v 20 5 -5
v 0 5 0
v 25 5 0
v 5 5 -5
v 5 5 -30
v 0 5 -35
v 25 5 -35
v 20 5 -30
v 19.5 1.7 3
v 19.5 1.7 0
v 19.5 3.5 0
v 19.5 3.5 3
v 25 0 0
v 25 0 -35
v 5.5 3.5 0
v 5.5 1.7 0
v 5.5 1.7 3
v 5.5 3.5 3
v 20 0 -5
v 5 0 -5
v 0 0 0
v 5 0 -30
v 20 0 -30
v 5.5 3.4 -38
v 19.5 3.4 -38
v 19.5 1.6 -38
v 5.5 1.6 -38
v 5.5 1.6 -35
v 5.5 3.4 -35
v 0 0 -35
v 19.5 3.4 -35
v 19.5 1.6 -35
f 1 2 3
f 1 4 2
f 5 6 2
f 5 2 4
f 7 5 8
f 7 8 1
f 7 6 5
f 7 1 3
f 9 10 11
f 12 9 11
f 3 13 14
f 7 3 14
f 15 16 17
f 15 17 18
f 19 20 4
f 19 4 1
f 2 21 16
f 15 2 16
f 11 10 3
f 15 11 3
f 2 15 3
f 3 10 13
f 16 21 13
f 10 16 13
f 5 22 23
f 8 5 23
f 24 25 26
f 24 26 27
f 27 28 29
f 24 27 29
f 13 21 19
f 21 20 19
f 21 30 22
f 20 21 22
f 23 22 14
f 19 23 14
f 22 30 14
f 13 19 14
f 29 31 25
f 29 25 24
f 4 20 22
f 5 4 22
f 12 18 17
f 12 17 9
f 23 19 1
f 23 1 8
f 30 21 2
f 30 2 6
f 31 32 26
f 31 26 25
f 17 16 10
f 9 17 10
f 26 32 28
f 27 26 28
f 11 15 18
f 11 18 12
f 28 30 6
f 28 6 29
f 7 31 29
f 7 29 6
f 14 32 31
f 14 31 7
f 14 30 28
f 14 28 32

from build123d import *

# Parameters (mm, degrees)
SKETCH1_W           = 25
SKETCH1_H           = 35
SKETCH1_W_2         = 15
SKETCH1_H_2         = 25
BOSS_EXTRUDE1_DEPTH = 5
SKETCH2_W           = 14
SKETCH2_H           = 1.8
BOSS_EXTRUDE2_DEPTH = 3
SKETCH3_W           = 14
SKETCH3_H           = 1.8
BOSS_EXTRUDE3_DEPTH = 3


with BuildPart() as part:
    # Sketch1 → Boss-Extrude1 (new body)
    with BuildSketch(Plane(origin=(0, 0, 0), x_dir=(1, 0, 0), z_dir=(0, 1, 0))):
        with Locations((12.5, 17.5)):
            Rectangle(SKETCH1_W, SKETCH1_H)
        with Locations((12.5, 17.5)):
            Rectangle(SKETCH1_W_2, SKETCH1_H_2, mode=Mode.SUBTRACT)
    extrude(amount=BOSS_EXTRUDE1_DEPTH)

    # Sketch2 → Boss-Extrude2 (add)
    with BuildSketch(Plane.XY):
        with Locations((12.5, 2.6)):
            Rectangle(SKETCH2_W, SKETCH2_H)
    extrude(amount=BOSS_EXTRUDE2_DEPTH)

    # Sketch3 → Boss-Extrude3 (add)
    with BuildSketch(Plane(origin=(0, 0, -35), x_dir=(-1, 0, 0), z_dir=(0, 0, -1))):
        with Locations((-12.5, 2.5)):
            Rectangle(SKETCH3_W, SKETCH3_H)
    extrude(amount=BOSS_EXTRUDE3_DEPTH)


solid = part.part
